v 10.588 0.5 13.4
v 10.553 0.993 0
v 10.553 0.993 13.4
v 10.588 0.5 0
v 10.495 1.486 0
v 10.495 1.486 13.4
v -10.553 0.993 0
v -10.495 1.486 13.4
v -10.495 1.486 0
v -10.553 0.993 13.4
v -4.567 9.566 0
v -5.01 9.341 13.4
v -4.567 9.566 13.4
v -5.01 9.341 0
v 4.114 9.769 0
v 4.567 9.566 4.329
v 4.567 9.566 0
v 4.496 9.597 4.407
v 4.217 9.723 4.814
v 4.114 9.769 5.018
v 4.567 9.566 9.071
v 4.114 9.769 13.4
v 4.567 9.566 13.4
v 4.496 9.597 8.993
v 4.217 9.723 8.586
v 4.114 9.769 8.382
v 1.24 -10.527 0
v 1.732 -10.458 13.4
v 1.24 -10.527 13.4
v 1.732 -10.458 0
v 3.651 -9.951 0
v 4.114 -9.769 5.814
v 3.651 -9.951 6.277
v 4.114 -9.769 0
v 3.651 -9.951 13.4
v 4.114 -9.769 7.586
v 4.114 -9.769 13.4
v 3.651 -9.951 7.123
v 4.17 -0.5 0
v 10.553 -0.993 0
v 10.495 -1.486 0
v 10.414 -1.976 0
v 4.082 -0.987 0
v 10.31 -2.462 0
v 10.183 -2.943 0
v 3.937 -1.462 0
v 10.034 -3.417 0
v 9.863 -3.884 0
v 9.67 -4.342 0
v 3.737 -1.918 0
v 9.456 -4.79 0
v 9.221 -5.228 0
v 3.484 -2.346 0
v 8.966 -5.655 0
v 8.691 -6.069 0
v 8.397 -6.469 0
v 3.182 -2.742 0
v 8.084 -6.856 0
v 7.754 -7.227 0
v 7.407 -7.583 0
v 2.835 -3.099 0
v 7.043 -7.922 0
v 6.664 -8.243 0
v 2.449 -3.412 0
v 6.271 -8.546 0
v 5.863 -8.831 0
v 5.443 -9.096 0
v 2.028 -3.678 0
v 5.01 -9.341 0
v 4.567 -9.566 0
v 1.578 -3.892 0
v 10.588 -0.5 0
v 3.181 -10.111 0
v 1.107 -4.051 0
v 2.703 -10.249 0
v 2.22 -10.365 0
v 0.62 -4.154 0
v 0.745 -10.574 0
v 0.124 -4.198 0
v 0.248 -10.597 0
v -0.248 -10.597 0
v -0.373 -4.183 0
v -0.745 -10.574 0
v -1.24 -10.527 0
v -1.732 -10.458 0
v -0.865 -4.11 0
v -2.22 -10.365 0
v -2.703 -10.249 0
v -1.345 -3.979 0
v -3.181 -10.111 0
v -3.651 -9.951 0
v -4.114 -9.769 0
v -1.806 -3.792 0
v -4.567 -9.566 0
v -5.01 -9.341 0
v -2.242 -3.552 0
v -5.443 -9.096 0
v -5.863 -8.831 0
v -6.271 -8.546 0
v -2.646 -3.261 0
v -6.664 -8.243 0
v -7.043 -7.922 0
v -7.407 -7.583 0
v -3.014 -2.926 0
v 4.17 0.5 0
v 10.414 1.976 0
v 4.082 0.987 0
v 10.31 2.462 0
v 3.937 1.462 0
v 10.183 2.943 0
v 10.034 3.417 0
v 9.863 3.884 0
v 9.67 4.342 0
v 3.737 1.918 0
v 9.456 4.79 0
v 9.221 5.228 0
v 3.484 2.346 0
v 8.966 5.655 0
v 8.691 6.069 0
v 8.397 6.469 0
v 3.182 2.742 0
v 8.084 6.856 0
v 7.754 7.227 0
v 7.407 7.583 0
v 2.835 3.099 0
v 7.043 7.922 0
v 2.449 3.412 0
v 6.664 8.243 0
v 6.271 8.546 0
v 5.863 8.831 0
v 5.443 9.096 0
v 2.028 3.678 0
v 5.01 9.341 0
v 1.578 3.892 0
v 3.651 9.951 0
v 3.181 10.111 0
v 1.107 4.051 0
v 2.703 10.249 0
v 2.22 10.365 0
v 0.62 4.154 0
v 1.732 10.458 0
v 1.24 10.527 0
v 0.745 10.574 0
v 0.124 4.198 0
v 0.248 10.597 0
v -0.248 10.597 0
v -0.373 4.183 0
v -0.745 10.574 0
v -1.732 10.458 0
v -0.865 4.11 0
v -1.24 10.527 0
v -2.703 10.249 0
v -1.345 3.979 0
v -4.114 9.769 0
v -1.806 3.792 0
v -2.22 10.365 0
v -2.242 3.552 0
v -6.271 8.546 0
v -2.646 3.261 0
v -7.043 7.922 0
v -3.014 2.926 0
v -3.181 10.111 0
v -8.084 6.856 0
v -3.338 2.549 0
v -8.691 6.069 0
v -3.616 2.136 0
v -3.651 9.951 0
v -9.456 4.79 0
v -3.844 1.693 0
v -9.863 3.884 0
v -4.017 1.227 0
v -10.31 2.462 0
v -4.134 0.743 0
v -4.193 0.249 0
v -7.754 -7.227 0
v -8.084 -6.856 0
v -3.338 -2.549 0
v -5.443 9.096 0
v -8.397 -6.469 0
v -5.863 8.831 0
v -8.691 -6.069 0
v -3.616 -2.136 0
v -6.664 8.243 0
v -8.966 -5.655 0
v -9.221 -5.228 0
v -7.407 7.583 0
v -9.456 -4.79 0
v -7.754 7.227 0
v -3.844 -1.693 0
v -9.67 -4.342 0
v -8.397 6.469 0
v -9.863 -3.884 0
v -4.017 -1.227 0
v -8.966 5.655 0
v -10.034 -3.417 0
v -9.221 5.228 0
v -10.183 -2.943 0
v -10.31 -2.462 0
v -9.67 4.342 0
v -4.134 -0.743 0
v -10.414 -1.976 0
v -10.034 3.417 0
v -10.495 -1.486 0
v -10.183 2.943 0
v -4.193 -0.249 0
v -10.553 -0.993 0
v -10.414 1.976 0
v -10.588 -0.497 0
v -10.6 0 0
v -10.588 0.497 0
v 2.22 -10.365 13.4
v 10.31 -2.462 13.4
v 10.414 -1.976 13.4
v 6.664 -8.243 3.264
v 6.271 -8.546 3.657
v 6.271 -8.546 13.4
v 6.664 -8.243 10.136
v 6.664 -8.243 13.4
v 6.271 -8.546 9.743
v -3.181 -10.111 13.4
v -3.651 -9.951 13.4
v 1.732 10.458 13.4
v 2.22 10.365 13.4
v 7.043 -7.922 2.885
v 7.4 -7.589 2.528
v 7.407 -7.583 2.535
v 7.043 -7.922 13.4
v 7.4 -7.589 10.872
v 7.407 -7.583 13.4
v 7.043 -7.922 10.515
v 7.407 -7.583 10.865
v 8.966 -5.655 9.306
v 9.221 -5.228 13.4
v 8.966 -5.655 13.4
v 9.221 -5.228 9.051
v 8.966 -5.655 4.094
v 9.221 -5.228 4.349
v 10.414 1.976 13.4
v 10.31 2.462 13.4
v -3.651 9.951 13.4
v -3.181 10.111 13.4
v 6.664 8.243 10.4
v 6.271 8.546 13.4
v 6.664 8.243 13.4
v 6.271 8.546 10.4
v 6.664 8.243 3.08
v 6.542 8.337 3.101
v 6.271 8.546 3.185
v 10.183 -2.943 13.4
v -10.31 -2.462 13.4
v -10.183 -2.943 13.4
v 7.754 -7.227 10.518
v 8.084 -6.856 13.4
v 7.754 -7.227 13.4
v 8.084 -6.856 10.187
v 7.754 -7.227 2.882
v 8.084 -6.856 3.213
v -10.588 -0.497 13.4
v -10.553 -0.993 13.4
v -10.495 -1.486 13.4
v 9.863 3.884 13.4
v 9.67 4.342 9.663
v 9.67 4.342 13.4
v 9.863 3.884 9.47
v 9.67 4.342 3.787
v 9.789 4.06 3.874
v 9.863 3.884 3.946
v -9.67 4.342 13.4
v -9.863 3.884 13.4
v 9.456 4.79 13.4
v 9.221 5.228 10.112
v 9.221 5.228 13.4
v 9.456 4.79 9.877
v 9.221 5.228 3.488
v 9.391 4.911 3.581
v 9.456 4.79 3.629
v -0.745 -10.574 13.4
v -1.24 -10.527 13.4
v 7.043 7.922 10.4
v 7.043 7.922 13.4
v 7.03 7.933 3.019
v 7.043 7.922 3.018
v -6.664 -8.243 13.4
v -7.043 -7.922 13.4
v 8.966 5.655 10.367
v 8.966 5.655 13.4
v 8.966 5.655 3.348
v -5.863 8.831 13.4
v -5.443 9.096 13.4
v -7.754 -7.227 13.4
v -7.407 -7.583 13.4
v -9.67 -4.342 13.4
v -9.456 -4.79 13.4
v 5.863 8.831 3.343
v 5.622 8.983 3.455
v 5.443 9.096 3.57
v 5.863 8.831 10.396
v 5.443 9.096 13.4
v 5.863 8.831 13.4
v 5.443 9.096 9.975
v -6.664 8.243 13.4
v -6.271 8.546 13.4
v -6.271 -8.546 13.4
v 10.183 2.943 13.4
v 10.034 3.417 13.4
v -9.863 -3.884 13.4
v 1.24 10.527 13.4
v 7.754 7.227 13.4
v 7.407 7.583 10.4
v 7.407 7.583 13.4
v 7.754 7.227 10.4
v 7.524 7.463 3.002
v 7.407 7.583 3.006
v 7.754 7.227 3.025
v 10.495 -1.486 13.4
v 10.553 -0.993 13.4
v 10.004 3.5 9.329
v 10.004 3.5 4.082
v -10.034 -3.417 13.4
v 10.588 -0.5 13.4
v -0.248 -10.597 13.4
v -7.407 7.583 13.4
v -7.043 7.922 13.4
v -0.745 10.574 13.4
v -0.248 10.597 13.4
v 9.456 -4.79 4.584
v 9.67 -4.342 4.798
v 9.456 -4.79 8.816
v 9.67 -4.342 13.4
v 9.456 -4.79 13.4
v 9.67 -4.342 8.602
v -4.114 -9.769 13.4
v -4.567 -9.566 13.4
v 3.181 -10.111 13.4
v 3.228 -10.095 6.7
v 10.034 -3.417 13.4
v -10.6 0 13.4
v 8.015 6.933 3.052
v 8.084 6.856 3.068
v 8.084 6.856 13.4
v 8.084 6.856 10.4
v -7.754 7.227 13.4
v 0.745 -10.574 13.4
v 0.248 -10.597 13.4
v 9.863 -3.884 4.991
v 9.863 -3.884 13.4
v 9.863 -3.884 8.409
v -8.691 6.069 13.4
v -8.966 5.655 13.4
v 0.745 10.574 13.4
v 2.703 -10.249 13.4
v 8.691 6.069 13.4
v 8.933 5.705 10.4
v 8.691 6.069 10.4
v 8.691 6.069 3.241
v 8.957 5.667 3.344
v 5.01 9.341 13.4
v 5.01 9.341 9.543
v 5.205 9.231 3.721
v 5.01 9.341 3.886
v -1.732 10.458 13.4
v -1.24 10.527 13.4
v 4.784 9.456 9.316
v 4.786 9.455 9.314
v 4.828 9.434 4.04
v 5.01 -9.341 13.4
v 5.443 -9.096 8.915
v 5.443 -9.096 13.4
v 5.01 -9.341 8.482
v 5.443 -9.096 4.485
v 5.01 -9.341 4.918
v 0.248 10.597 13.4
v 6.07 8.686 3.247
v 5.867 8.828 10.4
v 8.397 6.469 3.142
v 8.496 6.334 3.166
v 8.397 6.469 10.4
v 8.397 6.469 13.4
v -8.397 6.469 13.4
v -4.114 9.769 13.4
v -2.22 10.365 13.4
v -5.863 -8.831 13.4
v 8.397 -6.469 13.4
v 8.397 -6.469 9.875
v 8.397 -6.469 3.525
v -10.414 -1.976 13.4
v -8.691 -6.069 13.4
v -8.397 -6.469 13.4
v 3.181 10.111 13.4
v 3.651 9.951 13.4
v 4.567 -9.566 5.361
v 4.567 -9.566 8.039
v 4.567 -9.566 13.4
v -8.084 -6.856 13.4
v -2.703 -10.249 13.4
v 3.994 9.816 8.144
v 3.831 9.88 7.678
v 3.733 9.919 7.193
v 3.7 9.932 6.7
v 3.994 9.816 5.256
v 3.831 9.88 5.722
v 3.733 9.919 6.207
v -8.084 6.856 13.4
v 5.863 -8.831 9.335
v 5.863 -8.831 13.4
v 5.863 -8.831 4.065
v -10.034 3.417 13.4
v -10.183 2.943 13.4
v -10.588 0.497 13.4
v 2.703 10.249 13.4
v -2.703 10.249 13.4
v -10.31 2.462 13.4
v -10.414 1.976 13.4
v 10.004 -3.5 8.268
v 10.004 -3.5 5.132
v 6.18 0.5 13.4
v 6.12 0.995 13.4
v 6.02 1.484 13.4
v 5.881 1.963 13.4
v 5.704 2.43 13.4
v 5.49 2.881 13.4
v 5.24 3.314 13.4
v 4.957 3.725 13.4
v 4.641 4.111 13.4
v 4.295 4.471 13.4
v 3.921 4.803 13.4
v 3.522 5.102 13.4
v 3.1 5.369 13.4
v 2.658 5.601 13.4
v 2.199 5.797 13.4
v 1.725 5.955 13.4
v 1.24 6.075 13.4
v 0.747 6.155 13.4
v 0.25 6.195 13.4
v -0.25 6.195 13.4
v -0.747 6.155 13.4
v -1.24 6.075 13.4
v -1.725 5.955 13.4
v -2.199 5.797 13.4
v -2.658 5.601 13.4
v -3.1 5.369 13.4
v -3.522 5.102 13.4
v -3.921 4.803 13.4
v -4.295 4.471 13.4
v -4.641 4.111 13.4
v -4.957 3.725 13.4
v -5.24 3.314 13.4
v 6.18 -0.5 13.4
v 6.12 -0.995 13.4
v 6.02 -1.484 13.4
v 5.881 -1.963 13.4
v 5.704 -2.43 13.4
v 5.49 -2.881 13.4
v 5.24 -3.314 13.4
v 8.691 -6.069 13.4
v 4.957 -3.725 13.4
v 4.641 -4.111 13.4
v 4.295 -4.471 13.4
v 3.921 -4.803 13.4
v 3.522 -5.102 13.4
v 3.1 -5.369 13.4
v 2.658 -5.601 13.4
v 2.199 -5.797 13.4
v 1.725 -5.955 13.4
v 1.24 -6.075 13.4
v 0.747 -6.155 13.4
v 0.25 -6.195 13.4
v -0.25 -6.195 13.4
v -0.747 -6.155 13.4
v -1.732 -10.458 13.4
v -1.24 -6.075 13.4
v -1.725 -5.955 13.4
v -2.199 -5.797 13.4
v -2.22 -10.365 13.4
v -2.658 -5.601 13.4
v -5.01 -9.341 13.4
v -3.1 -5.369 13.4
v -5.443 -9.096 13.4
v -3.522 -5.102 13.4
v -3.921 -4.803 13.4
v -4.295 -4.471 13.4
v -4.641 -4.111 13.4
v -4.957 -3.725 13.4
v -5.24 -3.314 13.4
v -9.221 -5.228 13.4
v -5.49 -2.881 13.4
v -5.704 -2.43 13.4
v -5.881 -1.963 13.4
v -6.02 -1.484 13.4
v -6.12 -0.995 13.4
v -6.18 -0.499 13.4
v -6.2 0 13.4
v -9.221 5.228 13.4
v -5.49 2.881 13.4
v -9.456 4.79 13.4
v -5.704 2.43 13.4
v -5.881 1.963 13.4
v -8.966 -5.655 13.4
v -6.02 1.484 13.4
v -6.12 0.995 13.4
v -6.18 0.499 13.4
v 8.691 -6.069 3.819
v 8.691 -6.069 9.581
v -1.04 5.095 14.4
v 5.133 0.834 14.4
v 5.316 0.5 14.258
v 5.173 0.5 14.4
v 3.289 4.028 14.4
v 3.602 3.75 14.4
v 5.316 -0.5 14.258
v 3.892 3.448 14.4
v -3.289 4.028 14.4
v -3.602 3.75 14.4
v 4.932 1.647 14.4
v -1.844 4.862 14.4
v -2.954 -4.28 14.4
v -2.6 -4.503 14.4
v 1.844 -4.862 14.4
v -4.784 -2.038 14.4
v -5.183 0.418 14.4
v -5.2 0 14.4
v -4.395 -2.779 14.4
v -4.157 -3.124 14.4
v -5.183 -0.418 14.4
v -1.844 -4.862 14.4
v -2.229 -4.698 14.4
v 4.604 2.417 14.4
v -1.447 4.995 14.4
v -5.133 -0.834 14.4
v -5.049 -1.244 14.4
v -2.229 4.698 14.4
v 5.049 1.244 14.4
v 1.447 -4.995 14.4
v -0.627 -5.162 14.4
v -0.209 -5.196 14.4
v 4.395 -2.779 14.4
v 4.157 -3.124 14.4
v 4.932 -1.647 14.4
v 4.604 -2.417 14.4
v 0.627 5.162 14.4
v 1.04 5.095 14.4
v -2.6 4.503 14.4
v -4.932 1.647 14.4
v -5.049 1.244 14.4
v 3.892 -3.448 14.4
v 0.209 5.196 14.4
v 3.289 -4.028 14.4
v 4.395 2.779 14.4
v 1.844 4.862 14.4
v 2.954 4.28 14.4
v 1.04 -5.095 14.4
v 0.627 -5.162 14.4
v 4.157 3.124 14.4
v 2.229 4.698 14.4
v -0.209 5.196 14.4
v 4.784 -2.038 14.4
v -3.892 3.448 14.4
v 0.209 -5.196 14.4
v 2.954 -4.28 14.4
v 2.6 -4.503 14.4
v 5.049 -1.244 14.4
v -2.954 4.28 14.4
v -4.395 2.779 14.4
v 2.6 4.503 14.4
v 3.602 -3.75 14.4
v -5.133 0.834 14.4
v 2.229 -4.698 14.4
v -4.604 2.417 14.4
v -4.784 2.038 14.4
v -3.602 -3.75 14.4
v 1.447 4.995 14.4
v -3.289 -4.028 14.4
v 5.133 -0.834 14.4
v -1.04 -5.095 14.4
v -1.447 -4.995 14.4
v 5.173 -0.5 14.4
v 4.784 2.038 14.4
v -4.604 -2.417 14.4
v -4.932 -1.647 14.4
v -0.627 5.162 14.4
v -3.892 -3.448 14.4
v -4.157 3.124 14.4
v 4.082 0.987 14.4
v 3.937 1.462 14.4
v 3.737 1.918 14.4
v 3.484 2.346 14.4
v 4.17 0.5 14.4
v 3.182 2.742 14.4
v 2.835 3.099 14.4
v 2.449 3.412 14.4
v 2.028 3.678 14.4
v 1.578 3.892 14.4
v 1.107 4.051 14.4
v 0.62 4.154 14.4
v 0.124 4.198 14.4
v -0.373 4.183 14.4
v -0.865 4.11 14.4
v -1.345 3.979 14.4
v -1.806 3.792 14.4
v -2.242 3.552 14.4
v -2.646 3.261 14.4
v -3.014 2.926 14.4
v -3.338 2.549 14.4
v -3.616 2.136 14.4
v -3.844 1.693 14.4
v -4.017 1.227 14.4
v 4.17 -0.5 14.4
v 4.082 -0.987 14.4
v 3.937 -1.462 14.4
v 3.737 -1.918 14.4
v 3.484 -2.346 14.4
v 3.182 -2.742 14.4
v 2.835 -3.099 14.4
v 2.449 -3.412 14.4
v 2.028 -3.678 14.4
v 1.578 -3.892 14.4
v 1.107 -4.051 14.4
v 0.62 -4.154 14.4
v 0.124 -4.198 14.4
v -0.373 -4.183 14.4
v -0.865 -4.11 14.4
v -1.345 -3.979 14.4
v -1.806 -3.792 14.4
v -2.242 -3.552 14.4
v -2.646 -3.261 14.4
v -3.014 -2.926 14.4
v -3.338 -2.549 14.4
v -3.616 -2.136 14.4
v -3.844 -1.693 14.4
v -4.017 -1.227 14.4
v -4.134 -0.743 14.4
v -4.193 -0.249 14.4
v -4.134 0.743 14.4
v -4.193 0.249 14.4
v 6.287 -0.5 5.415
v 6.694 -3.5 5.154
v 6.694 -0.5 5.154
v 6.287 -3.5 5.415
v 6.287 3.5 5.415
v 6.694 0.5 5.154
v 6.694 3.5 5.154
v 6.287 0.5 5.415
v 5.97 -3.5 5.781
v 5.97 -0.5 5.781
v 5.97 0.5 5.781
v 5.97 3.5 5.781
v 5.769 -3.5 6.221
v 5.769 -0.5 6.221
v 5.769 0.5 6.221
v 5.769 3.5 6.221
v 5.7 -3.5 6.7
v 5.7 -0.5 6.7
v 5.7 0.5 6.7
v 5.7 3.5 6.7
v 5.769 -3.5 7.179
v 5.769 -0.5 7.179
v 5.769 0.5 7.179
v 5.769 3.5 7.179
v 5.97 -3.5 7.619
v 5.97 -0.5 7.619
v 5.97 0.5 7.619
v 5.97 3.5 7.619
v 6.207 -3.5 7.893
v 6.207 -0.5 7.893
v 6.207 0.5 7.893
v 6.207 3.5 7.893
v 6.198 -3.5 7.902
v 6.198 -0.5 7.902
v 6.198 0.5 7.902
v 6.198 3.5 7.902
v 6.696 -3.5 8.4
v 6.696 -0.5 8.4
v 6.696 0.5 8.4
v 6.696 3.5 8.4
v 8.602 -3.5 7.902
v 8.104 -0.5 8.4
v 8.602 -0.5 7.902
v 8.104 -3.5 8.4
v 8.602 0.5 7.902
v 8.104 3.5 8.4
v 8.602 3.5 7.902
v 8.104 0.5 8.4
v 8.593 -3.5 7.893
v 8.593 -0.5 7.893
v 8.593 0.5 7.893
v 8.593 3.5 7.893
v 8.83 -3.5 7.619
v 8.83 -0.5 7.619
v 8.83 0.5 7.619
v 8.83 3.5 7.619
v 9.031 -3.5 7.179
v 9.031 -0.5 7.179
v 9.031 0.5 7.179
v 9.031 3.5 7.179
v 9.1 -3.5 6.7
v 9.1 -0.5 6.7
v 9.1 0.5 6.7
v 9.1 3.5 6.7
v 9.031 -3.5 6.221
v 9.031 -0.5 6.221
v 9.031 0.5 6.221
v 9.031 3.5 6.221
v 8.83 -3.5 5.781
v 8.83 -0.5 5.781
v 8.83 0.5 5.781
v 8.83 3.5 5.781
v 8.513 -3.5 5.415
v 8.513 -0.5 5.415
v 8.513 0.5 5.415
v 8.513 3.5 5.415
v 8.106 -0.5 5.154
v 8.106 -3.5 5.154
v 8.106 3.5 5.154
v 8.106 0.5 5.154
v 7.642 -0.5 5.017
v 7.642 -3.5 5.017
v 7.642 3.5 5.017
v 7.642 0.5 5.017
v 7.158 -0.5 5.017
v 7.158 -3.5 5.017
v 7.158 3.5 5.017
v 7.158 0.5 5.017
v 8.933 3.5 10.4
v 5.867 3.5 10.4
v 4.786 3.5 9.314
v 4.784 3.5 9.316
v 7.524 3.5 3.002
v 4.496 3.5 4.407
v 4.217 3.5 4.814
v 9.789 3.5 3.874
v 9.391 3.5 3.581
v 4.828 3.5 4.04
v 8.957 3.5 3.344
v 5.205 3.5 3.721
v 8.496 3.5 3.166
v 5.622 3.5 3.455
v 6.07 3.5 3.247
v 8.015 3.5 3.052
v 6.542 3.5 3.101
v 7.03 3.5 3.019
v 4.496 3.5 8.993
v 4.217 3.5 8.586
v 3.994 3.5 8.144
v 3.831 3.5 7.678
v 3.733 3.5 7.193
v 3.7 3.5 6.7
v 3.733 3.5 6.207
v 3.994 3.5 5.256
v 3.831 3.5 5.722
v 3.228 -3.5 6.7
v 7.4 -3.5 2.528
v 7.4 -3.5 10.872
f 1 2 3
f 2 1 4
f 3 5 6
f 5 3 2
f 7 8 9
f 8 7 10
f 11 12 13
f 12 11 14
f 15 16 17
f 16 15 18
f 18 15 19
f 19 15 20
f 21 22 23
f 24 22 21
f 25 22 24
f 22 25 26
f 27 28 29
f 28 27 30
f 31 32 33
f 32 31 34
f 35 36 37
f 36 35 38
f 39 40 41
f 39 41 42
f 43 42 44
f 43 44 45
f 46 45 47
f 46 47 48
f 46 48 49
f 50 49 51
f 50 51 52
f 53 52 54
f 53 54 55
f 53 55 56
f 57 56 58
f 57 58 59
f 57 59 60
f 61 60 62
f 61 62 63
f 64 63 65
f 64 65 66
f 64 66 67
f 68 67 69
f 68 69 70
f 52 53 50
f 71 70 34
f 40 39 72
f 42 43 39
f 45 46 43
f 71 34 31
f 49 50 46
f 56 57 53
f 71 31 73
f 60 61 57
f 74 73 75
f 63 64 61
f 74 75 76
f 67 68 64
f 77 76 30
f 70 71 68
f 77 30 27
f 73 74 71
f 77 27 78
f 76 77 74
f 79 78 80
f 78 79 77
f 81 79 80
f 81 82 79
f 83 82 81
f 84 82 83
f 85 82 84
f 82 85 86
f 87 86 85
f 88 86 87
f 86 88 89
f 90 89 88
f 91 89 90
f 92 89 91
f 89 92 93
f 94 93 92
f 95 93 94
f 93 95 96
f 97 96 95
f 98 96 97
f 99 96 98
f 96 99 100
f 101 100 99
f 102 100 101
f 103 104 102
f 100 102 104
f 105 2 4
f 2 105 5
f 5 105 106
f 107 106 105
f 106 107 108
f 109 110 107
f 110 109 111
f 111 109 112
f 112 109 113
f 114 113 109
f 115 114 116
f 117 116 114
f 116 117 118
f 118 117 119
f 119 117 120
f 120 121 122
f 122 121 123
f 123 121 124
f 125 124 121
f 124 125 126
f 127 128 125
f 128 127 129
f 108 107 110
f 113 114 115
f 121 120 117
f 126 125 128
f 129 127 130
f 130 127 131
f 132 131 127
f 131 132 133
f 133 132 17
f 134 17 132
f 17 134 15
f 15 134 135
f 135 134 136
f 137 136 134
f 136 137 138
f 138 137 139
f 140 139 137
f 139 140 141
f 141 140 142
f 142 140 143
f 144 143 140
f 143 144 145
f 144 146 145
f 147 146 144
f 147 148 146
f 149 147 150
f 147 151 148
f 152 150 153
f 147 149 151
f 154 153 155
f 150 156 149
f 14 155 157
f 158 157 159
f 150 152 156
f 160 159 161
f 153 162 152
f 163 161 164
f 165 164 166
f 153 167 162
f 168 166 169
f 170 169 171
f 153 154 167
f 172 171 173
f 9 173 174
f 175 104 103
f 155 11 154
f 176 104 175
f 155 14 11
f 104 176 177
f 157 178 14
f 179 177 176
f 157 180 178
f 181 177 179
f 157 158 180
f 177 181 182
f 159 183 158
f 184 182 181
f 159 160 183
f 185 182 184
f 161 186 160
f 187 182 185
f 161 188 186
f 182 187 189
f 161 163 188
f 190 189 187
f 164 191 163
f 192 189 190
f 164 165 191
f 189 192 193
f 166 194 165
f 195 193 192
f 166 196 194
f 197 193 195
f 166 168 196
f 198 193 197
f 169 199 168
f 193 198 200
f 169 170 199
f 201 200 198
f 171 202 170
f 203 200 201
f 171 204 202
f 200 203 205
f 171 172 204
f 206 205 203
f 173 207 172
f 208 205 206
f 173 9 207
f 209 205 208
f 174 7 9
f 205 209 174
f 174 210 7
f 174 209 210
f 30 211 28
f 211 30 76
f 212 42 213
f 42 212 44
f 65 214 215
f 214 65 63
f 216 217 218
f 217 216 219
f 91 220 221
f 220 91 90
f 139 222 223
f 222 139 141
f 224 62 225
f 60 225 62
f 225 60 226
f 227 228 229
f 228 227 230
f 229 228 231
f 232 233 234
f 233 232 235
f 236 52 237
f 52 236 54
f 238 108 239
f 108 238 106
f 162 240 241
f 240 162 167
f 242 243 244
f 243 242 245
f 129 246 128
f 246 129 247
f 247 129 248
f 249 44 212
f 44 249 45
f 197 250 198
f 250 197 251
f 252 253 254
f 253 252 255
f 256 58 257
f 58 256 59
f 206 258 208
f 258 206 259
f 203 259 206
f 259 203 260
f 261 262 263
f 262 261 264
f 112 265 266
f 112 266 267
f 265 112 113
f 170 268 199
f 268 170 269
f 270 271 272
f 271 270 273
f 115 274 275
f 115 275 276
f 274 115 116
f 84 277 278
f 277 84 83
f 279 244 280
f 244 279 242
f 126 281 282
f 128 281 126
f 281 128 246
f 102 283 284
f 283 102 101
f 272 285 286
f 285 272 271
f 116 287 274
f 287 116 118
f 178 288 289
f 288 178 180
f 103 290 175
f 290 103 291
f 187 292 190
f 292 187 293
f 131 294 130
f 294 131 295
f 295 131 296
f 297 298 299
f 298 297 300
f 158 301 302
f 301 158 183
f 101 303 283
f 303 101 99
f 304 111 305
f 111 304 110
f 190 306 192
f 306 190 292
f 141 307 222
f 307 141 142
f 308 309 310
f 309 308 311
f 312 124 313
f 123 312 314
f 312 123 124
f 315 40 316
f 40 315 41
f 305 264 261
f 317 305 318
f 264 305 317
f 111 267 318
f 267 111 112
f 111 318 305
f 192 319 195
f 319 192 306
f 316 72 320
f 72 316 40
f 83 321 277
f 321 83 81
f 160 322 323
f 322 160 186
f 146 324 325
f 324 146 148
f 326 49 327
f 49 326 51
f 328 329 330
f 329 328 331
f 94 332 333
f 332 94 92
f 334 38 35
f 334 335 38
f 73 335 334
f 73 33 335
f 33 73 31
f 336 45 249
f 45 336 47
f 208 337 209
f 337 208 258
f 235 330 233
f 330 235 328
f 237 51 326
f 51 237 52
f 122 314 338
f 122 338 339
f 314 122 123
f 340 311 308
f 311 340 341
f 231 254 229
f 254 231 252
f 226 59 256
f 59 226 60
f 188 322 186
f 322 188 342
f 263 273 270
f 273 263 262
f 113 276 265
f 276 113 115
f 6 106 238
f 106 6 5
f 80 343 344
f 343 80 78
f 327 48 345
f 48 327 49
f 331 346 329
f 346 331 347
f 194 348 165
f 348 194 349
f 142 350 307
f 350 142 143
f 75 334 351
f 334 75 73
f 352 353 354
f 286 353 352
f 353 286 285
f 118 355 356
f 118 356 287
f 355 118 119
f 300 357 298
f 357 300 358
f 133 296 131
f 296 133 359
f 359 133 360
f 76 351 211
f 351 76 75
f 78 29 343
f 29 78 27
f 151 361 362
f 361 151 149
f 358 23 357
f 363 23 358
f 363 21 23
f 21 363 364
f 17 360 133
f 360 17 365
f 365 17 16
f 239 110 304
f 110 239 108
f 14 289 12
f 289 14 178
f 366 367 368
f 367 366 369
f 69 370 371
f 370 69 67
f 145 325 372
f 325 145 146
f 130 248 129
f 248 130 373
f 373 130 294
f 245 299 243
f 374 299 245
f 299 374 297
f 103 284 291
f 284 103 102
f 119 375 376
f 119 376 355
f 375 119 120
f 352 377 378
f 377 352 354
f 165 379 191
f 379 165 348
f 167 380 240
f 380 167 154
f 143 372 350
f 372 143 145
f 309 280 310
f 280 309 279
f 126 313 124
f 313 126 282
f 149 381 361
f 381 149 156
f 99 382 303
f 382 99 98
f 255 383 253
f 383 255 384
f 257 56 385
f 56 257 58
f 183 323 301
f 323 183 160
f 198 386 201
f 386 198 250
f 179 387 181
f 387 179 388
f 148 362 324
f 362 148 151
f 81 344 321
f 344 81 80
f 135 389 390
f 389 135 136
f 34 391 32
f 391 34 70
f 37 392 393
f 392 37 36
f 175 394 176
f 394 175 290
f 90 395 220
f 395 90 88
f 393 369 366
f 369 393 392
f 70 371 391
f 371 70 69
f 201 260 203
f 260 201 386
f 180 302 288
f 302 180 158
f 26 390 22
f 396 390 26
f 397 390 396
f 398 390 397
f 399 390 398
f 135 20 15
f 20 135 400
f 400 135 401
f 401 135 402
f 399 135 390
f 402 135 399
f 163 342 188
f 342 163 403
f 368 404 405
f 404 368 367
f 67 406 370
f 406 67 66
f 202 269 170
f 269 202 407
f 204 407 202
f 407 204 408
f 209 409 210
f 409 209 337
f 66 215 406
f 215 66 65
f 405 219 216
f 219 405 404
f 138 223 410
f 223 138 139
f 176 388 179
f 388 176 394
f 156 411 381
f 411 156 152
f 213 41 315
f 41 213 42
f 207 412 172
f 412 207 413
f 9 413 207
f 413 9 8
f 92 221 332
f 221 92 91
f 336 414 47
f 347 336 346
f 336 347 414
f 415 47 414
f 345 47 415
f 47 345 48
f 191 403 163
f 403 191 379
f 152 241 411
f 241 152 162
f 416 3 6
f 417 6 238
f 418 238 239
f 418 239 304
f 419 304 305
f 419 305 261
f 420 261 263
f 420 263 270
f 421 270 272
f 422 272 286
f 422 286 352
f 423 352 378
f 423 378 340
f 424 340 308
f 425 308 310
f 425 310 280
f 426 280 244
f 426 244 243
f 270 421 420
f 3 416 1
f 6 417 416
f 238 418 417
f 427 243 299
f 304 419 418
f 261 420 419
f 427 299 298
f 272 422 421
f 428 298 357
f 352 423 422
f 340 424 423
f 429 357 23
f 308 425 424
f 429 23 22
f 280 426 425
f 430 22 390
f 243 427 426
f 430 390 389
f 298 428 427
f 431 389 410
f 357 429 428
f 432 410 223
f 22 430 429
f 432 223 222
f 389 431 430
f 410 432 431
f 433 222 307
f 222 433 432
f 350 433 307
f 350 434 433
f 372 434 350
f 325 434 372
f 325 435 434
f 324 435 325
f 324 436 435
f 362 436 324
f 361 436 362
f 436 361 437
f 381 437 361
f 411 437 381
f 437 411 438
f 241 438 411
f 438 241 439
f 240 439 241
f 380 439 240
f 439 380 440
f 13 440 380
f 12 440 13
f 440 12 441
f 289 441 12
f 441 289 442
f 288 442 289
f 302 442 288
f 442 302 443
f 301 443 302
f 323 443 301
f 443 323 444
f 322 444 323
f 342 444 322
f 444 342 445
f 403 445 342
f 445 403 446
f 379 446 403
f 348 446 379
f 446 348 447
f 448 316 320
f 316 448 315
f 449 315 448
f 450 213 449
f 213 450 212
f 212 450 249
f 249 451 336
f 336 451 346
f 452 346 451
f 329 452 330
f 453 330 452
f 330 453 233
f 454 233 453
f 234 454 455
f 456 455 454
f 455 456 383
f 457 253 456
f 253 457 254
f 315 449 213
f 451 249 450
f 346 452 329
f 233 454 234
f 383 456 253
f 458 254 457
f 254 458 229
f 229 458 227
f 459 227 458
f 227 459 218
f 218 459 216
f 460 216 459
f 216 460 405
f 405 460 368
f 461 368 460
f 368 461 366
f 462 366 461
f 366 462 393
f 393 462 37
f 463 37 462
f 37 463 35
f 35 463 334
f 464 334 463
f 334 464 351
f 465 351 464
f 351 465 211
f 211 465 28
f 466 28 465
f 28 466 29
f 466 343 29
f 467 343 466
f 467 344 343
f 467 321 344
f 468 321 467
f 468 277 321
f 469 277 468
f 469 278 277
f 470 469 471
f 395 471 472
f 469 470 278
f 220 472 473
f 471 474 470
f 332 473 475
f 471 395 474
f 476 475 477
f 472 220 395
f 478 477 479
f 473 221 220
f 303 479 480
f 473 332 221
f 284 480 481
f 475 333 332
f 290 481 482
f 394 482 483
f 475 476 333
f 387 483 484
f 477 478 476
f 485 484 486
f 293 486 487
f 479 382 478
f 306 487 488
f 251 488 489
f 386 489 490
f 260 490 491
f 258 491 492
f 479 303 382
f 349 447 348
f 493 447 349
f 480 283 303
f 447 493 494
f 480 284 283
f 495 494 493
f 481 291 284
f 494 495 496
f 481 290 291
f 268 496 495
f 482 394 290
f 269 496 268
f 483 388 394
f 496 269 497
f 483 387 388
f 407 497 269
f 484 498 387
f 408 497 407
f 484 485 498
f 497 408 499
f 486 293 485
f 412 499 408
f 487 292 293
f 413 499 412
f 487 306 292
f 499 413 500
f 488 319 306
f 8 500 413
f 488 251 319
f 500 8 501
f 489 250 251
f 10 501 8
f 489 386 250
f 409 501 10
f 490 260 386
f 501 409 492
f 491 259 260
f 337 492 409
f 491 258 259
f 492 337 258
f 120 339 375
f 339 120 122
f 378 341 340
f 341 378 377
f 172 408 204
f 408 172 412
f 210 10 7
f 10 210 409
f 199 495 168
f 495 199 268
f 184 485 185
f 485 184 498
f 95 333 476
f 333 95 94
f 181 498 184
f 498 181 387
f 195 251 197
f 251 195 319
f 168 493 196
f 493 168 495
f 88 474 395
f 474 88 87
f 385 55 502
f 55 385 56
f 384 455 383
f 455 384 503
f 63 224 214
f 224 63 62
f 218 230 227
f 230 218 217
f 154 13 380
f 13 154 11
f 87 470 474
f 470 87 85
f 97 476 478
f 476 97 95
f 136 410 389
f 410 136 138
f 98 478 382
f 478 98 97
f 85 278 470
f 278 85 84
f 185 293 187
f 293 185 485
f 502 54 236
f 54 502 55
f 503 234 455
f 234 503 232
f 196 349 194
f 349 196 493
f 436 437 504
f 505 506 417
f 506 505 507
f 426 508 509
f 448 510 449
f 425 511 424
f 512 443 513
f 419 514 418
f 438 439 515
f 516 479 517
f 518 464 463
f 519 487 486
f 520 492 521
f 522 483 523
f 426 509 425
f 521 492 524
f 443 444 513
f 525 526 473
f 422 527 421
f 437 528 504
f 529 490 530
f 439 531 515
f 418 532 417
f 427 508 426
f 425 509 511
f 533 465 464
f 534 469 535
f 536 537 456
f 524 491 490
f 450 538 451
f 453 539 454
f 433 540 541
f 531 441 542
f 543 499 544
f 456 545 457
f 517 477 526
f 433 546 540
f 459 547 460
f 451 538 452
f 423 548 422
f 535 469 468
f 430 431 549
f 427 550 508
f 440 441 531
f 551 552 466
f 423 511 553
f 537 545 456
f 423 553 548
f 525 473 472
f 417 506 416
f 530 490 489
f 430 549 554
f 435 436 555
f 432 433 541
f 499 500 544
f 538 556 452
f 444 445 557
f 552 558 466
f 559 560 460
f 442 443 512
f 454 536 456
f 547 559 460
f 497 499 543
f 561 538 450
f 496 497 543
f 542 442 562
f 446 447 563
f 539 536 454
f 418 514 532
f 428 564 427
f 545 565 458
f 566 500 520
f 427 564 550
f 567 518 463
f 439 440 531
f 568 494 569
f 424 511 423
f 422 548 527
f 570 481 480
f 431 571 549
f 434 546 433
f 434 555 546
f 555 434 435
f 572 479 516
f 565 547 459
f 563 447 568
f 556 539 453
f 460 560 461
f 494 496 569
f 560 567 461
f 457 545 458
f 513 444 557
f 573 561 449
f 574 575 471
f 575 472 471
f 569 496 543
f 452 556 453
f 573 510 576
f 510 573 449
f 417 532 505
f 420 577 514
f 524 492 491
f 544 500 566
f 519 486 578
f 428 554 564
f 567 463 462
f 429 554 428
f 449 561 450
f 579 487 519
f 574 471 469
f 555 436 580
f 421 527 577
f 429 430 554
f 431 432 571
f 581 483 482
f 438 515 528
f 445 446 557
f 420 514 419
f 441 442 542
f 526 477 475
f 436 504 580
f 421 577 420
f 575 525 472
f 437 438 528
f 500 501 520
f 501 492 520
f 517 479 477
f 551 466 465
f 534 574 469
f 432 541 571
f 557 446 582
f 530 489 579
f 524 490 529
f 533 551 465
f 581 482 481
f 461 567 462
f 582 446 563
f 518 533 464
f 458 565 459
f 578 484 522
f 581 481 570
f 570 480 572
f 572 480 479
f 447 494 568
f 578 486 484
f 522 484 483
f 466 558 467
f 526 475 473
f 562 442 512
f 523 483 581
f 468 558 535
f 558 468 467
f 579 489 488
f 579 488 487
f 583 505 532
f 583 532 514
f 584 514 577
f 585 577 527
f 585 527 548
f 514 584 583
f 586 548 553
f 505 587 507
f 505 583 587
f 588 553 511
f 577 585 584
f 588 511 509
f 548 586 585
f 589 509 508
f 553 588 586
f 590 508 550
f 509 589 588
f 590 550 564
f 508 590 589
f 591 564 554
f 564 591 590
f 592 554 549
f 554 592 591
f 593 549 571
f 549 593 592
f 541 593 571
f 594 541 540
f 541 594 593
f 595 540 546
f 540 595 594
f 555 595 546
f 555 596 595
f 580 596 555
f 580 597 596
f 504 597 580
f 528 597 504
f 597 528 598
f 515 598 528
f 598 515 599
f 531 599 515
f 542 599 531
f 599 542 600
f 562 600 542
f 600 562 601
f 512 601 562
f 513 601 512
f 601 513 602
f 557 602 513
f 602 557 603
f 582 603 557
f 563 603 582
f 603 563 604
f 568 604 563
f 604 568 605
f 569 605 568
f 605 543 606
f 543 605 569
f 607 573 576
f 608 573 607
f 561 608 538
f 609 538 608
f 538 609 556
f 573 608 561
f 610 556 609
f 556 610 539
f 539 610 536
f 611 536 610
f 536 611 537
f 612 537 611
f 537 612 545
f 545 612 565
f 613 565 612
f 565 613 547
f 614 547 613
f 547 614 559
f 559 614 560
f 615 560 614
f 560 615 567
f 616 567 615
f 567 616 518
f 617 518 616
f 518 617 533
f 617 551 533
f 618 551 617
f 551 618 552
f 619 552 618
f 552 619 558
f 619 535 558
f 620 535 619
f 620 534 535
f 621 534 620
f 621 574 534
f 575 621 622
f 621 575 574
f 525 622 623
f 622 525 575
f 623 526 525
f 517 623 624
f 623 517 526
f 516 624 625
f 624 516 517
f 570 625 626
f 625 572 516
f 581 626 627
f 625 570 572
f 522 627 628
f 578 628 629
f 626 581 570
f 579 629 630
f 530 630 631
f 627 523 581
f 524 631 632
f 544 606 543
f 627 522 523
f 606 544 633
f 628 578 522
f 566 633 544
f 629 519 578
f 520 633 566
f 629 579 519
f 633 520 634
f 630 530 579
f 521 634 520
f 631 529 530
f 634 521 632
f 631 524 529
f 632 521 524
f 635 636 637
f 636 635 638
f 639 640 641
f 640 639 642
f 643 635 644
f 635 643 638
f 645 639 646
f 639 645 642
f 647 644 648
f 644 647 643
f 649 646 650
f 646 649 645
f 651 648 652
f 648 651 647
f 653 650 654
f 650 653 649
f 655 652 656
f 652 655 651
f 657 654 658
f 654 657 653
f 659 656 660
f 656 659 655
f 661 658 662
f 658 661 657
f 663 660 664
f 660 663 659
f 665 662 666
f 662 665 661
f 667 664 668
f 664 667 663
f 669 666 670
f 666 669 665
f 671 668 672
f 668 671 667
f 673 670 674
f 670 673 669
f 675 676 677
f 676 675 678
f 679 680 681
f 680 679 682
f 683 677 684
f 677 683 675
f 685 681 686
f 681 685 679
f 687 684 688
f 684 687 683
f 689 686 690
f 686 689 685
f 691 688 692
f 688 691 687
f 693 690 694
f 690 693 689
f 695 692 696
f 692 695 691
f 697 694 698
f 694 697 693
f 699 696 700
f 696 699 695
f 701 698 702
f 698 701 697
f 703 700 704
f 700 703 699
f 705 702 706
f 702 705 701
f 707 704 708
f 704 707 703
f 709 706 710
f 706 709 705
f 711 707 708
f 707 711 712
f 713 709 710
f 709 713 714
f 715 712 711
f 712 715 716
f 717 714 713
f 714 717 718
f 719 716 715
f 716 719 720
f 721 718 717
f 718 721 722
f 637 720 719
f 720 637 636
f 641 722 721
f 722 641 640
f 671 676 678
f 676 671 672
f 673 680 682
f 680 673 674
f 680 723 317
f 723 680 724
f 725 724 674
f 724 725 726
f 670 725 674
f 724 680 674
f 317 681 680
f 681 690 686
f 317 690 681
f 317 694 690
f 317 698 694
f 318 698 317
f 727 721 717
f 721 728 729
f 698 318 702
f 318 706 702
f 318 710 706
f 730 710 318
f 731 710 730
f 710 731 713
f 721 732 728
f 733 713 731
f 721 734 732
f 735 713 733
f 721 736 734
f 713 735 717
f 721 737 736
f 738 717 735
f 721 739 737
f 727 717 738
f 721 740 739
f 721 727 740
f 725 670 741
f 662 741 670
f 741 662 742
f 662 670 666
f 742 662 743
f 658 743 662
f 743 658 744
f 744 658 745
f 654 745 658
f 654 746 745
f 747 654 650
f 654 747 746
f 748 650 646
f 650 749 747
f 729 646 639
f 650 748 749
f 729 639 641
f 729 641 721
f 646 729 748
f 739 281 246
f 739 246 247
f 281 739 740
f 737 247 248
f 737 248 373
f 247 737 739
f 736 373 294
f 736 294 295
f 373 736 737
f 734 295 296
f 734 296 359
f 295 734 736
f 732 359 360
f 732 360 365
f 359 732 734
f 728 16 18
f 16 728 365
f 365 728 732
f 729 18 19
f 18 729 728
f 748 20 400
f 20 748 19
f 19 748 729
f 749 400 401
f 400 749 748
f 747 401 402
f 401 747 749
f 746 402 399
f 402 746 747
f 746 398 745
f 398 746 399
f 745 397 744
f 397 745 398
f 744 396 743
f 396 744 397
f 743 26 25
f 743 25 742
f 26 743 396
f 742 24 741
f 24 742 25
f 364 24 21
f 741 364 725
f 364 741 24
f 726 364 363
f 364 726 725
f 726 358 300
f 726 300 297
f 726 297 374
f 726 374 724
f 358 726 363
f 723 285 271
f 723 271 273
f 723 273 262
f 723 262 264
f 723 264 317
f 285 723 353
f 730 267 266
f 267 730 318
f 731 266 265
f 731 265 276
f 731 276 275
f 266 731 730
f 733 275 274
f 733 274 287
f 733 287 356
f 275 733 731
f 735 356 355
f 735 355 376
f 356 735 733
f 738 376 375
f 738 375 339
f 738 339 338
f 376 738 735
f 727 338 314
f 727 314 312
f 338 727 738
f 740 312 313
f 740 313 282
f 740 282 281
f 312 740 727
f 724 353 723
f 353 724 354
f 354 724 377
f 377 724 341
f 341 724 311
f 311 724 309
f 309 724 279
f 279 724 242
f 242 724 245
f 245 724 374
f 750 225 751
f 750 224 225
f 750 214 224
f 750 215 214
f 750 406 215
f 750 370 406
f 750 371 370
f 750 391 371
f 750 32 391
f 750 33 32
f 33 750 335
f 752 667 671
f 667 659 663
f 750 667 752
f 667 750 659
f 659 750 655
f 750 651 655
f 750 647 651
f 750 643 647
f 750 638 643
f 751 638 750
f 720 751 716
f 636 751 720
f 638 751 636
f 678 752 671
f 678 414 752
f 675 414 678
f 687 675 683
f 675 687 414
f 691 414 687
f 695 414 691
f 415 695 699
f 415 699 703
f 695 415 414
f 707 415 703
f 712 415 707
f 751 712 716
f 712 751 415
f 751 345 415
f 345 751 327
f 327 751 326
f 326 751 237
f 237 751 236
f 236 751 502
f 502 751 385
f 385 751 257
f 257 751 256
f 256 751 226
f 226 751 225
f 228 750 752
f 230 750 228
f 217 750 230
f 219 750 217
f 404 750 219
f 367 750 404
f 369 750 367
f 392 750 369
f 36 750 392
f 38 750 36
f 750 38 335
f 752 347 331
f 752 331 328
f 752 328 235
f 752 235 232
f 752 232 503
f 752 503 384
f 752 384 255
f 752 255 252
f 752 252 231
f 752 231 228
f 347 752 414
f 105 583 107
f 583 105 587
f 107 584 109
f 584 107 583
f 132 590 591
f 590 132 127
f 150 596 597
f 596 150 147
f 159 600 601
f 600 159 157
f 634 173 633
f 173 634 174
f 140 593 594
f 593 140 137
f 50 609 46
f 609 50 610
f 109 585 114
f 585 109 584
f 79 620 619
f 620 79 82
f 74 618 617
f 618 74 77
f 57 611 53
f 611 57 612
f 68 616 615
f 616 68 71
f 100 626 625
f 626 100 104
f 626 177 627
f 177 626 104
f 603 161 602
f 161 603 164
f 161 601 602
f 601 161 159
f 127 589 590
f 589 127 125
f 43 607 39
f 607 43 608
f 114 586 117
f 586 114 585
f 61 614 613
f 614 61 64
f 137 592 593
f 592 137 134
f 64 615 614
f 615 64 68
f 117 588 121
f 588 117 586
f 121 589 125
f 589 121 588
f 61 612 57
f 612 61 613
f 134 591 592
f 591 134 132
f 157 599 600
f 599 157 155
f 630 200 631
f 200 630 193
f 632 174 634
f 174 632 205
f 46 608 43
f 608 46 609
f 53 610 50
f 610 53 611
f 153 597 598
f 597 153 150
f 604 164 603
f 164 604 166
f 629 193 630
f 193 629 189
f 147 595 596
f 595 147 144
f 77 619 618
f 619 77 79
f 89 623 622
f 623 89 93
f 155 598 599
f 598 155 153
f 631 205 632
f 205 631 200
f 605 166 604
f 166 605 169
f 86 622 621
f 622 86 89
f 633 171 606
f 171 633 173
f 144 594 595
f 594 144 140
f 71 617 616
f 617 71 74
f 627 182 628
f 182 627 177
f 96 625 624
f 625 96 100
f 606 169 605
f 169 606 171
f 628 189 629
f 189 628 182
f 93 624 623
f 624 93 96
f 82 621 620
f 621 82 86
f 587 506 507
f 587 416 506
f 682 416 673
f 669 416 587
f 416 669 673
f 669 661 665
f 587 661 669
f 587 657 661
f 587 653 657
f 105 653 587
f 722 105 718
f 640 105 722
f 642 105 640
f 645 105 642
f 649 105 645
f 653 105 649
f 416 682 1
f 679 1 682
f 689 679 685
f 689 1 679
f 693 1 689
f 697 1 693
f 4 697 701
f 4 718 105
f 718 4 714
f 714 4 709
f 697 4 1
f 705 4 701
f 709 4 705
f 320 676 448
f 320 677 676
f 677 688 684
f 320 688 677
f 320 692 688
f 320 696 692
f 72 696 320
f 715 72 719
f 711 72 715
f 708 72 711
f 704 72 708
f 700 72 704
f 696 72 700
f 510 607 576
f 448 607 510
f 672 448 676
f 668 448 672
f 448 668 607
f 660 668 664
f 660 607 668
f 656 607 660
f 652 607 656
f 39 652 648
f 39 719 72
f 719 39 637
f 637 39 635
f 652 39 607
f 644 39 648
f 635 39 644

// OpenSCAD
// file: functions.scad
/*******************************************************************

This OpenSCAD code and its rendered 3D model are part of the

	Kühling&Kühling RepRap Industrial 3D Printer


All details, BOM, assembling instructions and latest sources:
	http://kuehlingkuehling.de

Designed and developed by:
	Jonas Kühling <mail@jonaskuehling.de>
	Simon Kühling <mail@simonkuehling.de>

License:
	Creative Commons Attribution-ShareAlike 4.0 International (CC BY-SA 4.0)
	https://creativecommons.org/licenses/by-sa/4.0/

*******************************************************************/

module teardrop (r=4.5,h=20,alpha=45,teardropcorner=0,fulldrop=0){		// tear drop hole for top-centering
											// use teardropcorner=1 for bottom horizontal corners
	render()
	translate([-h/2,0,0])
		rotate([-270,0+(teardropcorner*180),90])
			difference(){
				linear_extrude(height=h){
					circle(r);
					polygon(points=[[0,0],[r*cos(alpha),r*sin(alpha)],[0,r/sin(alpha)],[-r*cos(alpha),r*sin(alpha)]], paths=[[0,1,2,3]]);
				}
				if(fulldrop==0) 
					translate([0,(r/sin(alpha))/2+r,h/2]) cube([2*r+2,r/sin(alpha),h+2],center=true);
			}
}

//teardrop(4.5,22,fulldrop=true);



module teardropcentering (r=4.5,h=20,alpha=45){				// tear drop hole for top-centering
	centering_offset_factor = 1.1;
	render()
	translate([-h/2,0,0])
		rotate([-270,0,90])
			difference(){
				linear_extrude(height=h){
					circle(r, $fn=24);
					polygon(points=[[0,0],[r*cos(alpha),r*sin(alpha)],[0,r/sin(alpha)],[-r*cos(alpha),r*sin(alpha)]], paths=[[0,1,2,3]]);
				}
				translate([0,(r/sin(alpha))/2+r*centering_offset_factor,h/2]) cube([2*r+2,r/sin(alpha),h+2],center=true);
			}
}

//teardropcentering();



module teardropcentering_half (r=4.5,h=20, bottom=0,alpha=45){				// tear drop hole for top-centering
																// upper half (bottom=0) or bottom half (bottom=1)
	centering_offset_factor = 1.2;
	render()
	translate([-h/2,0,0])
		rotate([-270,0,90])
			difference(){
				linear_extrude(height=h){
					circle(r, $fn=24);
					polygon(points=[[0,0],[r*cos(alpha),r*sin(alpha)],[0,r/sin(alpha)],[-r*cos(alpha),r*sin(alpha)]], paths=[[0,1,2,3]]);
				}
				translate([0,(r/sin(alpha))/2+r*centering_offset_factor,h/2]) cube([2*r+2,r/sin(alpha),h+2],center=true);
				translate([0,-(r*centering_offset_factor)/2-0.5+bottom*(r*centering_offset_factor+1),h/2]) cube([2*r+2,r*centering_offset_factor+1,h+2],center=true);
			}
}

//teardropcentering_half(bottom=0);


module polyhole(d,h){
	n = max(round(2 * d),3);
	cylinder(h = h, r = (d / 2) / cos (180 / n), $fn = n, center=true);
}



module roundcorner(radius,edge_length){
	render()
	translate([0,0,-1])
		difference(){
			translate([-1,-1,0])
				cube(size = [radius+1,radius+1,edge_length+2], center = false);
			translate(v = [radius,radius,-1])
				cylinder(h = edge_length+4, r=radius, center=false,$fs=0.1);
		}
}

//roundcorner(5,5);



module roundcorner_tear(radius,edge_length){
	render()
	difference(){
		translate([-1,-1,-1])
			cube(size = [edge_length+2, radius+1, radius+1], center = false);
		translate([(edge_length+4)/2-2, radius, radius])
			teardrop(radius, edge_length+4,teardropcorner=1);
	}
}

//roundcorner_tear(8,20);


module roundedge_tear(radius){
	render()
	difference(){
		translate([-1,-1,-1])
			cube(size = [radius+1, radius+1, radius+1], center = false);
		translate([radius,radius,radius])
			union(){
				sphere(r=radius, $fs=0.1);
				translate([0,0,-radius])
					cylinder(r1=(radius*sin(45))-(radius-(radius*sin(45))),r2=radius*sin(45),h=(radius-(radius*sin(45))), $fs=0.1);
			}
	}
}

//roundedge_tear(20);



module roundedge(radius){
	render()
	difference(){
		translate([-1,-1,-1])
			cube(size = [radius+1, radius+1, radius+1], center = false);
		translate([radius,radius,radius])
			sphere(r=radius, $fs=0.1);
	}
}

//roundedge(5);


module nut_trap(nut_wrench_size,trap_height,vertical=0, clearance=0.2,center=true){		// M3 wrench size = 5.5
	radius = cornerdiameter(nut_wrench_size+2*clearance) /2;
	rotate([0,vertical*90,0])
		cylinder(h = trap_height, r = radius, center=center, $fn = 6);
}

module nut_trap_square(nut_wrench_size,trap_height,vertical=0, clearance=0.2,center=true){		// M3 wrench size = 5.5
	rotate([0,vertical*90,0])
		cube([nut_wrench_size+2*clearance,nut_wrench_size+2*clearance,trap_height],center=center);
}

//nut_trap_square(5,5,0);

module nut_slot(nut_wrench_size,nut_height, nut_elevation,vertical=0, clearance=0.2){		// M3 wrench size = 5.5
	radius = cornerdiameter(nut_wrench_size+2*clearance) /2;
	slot_height = nut_height+2*clearance;
	slot_width = nut_wrench_size+2*clearance;
	rotate([0,vertical*270,0]){
		cylinder(h = slot_height, r = radius, center=true, $fn = 6);
		translate([0,-slot_width/2,-slot_height/2]) cube([nut_elevation+1,slot_width,slot_height]);
	}
}

module nut_slot_square(nut_wrench_size,nut_height, nut_elevation,vertical=0, clearance=0.2){		// M3 wrench size = 5.5
	slot_height = nut_height+2*clearance;
	slot_width = nut_wrench_size+2*clearance;
	rotate([0,vertical*270,0]){
		cube([slot_width,slot_width,slot_height],center=true);
		translate([0,-slot_width/2,-slot_height/2]) cube([nut_elevation+1,slot_width,slot_height]);
	}
}

//nut_slot_square(5.5,3,4,1);

function cornerdiameter(wrench_size) =  2* ((wrench_size)/2)/ cos(180/6);
function cornerdiameter_8(wrench_size) =  2* ((wrench_size)/2)/ cos(180/8);
function cornerdiameter_4(wrench_size) =  2* ((wrench_size)/2)/ cos(180/4);
// main file
/*******************************************************************

This OpenSCAD code and its rendered 3D model are part of the

	Kühling&Kühling RepRap Industrial 3D Printer


All details, BOM, assembling instructions and latest sources:
	http://kuehlingkuehling.de

Designed and developed by:
	Jonas Kühling <mail@jonaskuehling.de>
	Simon Kühling <mail@simonkuehling.de>

License:
	Creative Commons Attribution-ShareAlike 4.0 International (CC BY-SA 4.0)
	https://creativecommons.org/licenses/by-sa/4.0/

*******************************************************************/

include <configuration.scad>



// RENDERING
set_collar();




module set_collar(){
	difference(){
	
		// main body
		union(){
			cylinder(r=set_collar_body_dia/2, h=set_collar_body_height);
			translate([0,0,set_collar_body_height])
				cylinder(r1=z_spindle_dia/2+clearance+2*wall_thin, r2=z_spindle_dia/2+clearance+wall_thin, h=wall_thin);
		}
	
		// spindle hole
		translate([0,0,-1])
			cylinder(r=z_spindle_dia/2+clearance, h=set_collar_body_height+wall_thin+2);
	
		// slot
		translate([0,-wall_thin/2,-1])
			cube([set_collar_body_dia/2+1,wall_thin,set_collar_body_height+wall_thin+2]);
	
		// screw hole and nut trap
		translate([set_collar_body_dia/2-(set_collar_body_dia/2-z_spindle_dia/2-clearance)/2,0,set_collar_body_height/2]){
			rotate([0,0,90])
				teardrop(set_collar_screw_dia/2+clearance,set_collar_body_dia+2);
			translate([0,(set_collar_body_dia/2+1)/2+wall_thin/2+wall,0])
				rotate([0,0,90])
					teardrop(set_collar_screw_washer_dia/2+clearance,set_collar_body_dia/2+1);
			translate([0,-(set_collar_body_dia/2+1)/2-wall_thin/2-wall,0])
				rotate([90,0,0])
					rotate([0,0,45])
						nut_trap_square(set_collar_screw_nut_wrench,set_collar_body_dia/2+1);
		}
	
	}
}
